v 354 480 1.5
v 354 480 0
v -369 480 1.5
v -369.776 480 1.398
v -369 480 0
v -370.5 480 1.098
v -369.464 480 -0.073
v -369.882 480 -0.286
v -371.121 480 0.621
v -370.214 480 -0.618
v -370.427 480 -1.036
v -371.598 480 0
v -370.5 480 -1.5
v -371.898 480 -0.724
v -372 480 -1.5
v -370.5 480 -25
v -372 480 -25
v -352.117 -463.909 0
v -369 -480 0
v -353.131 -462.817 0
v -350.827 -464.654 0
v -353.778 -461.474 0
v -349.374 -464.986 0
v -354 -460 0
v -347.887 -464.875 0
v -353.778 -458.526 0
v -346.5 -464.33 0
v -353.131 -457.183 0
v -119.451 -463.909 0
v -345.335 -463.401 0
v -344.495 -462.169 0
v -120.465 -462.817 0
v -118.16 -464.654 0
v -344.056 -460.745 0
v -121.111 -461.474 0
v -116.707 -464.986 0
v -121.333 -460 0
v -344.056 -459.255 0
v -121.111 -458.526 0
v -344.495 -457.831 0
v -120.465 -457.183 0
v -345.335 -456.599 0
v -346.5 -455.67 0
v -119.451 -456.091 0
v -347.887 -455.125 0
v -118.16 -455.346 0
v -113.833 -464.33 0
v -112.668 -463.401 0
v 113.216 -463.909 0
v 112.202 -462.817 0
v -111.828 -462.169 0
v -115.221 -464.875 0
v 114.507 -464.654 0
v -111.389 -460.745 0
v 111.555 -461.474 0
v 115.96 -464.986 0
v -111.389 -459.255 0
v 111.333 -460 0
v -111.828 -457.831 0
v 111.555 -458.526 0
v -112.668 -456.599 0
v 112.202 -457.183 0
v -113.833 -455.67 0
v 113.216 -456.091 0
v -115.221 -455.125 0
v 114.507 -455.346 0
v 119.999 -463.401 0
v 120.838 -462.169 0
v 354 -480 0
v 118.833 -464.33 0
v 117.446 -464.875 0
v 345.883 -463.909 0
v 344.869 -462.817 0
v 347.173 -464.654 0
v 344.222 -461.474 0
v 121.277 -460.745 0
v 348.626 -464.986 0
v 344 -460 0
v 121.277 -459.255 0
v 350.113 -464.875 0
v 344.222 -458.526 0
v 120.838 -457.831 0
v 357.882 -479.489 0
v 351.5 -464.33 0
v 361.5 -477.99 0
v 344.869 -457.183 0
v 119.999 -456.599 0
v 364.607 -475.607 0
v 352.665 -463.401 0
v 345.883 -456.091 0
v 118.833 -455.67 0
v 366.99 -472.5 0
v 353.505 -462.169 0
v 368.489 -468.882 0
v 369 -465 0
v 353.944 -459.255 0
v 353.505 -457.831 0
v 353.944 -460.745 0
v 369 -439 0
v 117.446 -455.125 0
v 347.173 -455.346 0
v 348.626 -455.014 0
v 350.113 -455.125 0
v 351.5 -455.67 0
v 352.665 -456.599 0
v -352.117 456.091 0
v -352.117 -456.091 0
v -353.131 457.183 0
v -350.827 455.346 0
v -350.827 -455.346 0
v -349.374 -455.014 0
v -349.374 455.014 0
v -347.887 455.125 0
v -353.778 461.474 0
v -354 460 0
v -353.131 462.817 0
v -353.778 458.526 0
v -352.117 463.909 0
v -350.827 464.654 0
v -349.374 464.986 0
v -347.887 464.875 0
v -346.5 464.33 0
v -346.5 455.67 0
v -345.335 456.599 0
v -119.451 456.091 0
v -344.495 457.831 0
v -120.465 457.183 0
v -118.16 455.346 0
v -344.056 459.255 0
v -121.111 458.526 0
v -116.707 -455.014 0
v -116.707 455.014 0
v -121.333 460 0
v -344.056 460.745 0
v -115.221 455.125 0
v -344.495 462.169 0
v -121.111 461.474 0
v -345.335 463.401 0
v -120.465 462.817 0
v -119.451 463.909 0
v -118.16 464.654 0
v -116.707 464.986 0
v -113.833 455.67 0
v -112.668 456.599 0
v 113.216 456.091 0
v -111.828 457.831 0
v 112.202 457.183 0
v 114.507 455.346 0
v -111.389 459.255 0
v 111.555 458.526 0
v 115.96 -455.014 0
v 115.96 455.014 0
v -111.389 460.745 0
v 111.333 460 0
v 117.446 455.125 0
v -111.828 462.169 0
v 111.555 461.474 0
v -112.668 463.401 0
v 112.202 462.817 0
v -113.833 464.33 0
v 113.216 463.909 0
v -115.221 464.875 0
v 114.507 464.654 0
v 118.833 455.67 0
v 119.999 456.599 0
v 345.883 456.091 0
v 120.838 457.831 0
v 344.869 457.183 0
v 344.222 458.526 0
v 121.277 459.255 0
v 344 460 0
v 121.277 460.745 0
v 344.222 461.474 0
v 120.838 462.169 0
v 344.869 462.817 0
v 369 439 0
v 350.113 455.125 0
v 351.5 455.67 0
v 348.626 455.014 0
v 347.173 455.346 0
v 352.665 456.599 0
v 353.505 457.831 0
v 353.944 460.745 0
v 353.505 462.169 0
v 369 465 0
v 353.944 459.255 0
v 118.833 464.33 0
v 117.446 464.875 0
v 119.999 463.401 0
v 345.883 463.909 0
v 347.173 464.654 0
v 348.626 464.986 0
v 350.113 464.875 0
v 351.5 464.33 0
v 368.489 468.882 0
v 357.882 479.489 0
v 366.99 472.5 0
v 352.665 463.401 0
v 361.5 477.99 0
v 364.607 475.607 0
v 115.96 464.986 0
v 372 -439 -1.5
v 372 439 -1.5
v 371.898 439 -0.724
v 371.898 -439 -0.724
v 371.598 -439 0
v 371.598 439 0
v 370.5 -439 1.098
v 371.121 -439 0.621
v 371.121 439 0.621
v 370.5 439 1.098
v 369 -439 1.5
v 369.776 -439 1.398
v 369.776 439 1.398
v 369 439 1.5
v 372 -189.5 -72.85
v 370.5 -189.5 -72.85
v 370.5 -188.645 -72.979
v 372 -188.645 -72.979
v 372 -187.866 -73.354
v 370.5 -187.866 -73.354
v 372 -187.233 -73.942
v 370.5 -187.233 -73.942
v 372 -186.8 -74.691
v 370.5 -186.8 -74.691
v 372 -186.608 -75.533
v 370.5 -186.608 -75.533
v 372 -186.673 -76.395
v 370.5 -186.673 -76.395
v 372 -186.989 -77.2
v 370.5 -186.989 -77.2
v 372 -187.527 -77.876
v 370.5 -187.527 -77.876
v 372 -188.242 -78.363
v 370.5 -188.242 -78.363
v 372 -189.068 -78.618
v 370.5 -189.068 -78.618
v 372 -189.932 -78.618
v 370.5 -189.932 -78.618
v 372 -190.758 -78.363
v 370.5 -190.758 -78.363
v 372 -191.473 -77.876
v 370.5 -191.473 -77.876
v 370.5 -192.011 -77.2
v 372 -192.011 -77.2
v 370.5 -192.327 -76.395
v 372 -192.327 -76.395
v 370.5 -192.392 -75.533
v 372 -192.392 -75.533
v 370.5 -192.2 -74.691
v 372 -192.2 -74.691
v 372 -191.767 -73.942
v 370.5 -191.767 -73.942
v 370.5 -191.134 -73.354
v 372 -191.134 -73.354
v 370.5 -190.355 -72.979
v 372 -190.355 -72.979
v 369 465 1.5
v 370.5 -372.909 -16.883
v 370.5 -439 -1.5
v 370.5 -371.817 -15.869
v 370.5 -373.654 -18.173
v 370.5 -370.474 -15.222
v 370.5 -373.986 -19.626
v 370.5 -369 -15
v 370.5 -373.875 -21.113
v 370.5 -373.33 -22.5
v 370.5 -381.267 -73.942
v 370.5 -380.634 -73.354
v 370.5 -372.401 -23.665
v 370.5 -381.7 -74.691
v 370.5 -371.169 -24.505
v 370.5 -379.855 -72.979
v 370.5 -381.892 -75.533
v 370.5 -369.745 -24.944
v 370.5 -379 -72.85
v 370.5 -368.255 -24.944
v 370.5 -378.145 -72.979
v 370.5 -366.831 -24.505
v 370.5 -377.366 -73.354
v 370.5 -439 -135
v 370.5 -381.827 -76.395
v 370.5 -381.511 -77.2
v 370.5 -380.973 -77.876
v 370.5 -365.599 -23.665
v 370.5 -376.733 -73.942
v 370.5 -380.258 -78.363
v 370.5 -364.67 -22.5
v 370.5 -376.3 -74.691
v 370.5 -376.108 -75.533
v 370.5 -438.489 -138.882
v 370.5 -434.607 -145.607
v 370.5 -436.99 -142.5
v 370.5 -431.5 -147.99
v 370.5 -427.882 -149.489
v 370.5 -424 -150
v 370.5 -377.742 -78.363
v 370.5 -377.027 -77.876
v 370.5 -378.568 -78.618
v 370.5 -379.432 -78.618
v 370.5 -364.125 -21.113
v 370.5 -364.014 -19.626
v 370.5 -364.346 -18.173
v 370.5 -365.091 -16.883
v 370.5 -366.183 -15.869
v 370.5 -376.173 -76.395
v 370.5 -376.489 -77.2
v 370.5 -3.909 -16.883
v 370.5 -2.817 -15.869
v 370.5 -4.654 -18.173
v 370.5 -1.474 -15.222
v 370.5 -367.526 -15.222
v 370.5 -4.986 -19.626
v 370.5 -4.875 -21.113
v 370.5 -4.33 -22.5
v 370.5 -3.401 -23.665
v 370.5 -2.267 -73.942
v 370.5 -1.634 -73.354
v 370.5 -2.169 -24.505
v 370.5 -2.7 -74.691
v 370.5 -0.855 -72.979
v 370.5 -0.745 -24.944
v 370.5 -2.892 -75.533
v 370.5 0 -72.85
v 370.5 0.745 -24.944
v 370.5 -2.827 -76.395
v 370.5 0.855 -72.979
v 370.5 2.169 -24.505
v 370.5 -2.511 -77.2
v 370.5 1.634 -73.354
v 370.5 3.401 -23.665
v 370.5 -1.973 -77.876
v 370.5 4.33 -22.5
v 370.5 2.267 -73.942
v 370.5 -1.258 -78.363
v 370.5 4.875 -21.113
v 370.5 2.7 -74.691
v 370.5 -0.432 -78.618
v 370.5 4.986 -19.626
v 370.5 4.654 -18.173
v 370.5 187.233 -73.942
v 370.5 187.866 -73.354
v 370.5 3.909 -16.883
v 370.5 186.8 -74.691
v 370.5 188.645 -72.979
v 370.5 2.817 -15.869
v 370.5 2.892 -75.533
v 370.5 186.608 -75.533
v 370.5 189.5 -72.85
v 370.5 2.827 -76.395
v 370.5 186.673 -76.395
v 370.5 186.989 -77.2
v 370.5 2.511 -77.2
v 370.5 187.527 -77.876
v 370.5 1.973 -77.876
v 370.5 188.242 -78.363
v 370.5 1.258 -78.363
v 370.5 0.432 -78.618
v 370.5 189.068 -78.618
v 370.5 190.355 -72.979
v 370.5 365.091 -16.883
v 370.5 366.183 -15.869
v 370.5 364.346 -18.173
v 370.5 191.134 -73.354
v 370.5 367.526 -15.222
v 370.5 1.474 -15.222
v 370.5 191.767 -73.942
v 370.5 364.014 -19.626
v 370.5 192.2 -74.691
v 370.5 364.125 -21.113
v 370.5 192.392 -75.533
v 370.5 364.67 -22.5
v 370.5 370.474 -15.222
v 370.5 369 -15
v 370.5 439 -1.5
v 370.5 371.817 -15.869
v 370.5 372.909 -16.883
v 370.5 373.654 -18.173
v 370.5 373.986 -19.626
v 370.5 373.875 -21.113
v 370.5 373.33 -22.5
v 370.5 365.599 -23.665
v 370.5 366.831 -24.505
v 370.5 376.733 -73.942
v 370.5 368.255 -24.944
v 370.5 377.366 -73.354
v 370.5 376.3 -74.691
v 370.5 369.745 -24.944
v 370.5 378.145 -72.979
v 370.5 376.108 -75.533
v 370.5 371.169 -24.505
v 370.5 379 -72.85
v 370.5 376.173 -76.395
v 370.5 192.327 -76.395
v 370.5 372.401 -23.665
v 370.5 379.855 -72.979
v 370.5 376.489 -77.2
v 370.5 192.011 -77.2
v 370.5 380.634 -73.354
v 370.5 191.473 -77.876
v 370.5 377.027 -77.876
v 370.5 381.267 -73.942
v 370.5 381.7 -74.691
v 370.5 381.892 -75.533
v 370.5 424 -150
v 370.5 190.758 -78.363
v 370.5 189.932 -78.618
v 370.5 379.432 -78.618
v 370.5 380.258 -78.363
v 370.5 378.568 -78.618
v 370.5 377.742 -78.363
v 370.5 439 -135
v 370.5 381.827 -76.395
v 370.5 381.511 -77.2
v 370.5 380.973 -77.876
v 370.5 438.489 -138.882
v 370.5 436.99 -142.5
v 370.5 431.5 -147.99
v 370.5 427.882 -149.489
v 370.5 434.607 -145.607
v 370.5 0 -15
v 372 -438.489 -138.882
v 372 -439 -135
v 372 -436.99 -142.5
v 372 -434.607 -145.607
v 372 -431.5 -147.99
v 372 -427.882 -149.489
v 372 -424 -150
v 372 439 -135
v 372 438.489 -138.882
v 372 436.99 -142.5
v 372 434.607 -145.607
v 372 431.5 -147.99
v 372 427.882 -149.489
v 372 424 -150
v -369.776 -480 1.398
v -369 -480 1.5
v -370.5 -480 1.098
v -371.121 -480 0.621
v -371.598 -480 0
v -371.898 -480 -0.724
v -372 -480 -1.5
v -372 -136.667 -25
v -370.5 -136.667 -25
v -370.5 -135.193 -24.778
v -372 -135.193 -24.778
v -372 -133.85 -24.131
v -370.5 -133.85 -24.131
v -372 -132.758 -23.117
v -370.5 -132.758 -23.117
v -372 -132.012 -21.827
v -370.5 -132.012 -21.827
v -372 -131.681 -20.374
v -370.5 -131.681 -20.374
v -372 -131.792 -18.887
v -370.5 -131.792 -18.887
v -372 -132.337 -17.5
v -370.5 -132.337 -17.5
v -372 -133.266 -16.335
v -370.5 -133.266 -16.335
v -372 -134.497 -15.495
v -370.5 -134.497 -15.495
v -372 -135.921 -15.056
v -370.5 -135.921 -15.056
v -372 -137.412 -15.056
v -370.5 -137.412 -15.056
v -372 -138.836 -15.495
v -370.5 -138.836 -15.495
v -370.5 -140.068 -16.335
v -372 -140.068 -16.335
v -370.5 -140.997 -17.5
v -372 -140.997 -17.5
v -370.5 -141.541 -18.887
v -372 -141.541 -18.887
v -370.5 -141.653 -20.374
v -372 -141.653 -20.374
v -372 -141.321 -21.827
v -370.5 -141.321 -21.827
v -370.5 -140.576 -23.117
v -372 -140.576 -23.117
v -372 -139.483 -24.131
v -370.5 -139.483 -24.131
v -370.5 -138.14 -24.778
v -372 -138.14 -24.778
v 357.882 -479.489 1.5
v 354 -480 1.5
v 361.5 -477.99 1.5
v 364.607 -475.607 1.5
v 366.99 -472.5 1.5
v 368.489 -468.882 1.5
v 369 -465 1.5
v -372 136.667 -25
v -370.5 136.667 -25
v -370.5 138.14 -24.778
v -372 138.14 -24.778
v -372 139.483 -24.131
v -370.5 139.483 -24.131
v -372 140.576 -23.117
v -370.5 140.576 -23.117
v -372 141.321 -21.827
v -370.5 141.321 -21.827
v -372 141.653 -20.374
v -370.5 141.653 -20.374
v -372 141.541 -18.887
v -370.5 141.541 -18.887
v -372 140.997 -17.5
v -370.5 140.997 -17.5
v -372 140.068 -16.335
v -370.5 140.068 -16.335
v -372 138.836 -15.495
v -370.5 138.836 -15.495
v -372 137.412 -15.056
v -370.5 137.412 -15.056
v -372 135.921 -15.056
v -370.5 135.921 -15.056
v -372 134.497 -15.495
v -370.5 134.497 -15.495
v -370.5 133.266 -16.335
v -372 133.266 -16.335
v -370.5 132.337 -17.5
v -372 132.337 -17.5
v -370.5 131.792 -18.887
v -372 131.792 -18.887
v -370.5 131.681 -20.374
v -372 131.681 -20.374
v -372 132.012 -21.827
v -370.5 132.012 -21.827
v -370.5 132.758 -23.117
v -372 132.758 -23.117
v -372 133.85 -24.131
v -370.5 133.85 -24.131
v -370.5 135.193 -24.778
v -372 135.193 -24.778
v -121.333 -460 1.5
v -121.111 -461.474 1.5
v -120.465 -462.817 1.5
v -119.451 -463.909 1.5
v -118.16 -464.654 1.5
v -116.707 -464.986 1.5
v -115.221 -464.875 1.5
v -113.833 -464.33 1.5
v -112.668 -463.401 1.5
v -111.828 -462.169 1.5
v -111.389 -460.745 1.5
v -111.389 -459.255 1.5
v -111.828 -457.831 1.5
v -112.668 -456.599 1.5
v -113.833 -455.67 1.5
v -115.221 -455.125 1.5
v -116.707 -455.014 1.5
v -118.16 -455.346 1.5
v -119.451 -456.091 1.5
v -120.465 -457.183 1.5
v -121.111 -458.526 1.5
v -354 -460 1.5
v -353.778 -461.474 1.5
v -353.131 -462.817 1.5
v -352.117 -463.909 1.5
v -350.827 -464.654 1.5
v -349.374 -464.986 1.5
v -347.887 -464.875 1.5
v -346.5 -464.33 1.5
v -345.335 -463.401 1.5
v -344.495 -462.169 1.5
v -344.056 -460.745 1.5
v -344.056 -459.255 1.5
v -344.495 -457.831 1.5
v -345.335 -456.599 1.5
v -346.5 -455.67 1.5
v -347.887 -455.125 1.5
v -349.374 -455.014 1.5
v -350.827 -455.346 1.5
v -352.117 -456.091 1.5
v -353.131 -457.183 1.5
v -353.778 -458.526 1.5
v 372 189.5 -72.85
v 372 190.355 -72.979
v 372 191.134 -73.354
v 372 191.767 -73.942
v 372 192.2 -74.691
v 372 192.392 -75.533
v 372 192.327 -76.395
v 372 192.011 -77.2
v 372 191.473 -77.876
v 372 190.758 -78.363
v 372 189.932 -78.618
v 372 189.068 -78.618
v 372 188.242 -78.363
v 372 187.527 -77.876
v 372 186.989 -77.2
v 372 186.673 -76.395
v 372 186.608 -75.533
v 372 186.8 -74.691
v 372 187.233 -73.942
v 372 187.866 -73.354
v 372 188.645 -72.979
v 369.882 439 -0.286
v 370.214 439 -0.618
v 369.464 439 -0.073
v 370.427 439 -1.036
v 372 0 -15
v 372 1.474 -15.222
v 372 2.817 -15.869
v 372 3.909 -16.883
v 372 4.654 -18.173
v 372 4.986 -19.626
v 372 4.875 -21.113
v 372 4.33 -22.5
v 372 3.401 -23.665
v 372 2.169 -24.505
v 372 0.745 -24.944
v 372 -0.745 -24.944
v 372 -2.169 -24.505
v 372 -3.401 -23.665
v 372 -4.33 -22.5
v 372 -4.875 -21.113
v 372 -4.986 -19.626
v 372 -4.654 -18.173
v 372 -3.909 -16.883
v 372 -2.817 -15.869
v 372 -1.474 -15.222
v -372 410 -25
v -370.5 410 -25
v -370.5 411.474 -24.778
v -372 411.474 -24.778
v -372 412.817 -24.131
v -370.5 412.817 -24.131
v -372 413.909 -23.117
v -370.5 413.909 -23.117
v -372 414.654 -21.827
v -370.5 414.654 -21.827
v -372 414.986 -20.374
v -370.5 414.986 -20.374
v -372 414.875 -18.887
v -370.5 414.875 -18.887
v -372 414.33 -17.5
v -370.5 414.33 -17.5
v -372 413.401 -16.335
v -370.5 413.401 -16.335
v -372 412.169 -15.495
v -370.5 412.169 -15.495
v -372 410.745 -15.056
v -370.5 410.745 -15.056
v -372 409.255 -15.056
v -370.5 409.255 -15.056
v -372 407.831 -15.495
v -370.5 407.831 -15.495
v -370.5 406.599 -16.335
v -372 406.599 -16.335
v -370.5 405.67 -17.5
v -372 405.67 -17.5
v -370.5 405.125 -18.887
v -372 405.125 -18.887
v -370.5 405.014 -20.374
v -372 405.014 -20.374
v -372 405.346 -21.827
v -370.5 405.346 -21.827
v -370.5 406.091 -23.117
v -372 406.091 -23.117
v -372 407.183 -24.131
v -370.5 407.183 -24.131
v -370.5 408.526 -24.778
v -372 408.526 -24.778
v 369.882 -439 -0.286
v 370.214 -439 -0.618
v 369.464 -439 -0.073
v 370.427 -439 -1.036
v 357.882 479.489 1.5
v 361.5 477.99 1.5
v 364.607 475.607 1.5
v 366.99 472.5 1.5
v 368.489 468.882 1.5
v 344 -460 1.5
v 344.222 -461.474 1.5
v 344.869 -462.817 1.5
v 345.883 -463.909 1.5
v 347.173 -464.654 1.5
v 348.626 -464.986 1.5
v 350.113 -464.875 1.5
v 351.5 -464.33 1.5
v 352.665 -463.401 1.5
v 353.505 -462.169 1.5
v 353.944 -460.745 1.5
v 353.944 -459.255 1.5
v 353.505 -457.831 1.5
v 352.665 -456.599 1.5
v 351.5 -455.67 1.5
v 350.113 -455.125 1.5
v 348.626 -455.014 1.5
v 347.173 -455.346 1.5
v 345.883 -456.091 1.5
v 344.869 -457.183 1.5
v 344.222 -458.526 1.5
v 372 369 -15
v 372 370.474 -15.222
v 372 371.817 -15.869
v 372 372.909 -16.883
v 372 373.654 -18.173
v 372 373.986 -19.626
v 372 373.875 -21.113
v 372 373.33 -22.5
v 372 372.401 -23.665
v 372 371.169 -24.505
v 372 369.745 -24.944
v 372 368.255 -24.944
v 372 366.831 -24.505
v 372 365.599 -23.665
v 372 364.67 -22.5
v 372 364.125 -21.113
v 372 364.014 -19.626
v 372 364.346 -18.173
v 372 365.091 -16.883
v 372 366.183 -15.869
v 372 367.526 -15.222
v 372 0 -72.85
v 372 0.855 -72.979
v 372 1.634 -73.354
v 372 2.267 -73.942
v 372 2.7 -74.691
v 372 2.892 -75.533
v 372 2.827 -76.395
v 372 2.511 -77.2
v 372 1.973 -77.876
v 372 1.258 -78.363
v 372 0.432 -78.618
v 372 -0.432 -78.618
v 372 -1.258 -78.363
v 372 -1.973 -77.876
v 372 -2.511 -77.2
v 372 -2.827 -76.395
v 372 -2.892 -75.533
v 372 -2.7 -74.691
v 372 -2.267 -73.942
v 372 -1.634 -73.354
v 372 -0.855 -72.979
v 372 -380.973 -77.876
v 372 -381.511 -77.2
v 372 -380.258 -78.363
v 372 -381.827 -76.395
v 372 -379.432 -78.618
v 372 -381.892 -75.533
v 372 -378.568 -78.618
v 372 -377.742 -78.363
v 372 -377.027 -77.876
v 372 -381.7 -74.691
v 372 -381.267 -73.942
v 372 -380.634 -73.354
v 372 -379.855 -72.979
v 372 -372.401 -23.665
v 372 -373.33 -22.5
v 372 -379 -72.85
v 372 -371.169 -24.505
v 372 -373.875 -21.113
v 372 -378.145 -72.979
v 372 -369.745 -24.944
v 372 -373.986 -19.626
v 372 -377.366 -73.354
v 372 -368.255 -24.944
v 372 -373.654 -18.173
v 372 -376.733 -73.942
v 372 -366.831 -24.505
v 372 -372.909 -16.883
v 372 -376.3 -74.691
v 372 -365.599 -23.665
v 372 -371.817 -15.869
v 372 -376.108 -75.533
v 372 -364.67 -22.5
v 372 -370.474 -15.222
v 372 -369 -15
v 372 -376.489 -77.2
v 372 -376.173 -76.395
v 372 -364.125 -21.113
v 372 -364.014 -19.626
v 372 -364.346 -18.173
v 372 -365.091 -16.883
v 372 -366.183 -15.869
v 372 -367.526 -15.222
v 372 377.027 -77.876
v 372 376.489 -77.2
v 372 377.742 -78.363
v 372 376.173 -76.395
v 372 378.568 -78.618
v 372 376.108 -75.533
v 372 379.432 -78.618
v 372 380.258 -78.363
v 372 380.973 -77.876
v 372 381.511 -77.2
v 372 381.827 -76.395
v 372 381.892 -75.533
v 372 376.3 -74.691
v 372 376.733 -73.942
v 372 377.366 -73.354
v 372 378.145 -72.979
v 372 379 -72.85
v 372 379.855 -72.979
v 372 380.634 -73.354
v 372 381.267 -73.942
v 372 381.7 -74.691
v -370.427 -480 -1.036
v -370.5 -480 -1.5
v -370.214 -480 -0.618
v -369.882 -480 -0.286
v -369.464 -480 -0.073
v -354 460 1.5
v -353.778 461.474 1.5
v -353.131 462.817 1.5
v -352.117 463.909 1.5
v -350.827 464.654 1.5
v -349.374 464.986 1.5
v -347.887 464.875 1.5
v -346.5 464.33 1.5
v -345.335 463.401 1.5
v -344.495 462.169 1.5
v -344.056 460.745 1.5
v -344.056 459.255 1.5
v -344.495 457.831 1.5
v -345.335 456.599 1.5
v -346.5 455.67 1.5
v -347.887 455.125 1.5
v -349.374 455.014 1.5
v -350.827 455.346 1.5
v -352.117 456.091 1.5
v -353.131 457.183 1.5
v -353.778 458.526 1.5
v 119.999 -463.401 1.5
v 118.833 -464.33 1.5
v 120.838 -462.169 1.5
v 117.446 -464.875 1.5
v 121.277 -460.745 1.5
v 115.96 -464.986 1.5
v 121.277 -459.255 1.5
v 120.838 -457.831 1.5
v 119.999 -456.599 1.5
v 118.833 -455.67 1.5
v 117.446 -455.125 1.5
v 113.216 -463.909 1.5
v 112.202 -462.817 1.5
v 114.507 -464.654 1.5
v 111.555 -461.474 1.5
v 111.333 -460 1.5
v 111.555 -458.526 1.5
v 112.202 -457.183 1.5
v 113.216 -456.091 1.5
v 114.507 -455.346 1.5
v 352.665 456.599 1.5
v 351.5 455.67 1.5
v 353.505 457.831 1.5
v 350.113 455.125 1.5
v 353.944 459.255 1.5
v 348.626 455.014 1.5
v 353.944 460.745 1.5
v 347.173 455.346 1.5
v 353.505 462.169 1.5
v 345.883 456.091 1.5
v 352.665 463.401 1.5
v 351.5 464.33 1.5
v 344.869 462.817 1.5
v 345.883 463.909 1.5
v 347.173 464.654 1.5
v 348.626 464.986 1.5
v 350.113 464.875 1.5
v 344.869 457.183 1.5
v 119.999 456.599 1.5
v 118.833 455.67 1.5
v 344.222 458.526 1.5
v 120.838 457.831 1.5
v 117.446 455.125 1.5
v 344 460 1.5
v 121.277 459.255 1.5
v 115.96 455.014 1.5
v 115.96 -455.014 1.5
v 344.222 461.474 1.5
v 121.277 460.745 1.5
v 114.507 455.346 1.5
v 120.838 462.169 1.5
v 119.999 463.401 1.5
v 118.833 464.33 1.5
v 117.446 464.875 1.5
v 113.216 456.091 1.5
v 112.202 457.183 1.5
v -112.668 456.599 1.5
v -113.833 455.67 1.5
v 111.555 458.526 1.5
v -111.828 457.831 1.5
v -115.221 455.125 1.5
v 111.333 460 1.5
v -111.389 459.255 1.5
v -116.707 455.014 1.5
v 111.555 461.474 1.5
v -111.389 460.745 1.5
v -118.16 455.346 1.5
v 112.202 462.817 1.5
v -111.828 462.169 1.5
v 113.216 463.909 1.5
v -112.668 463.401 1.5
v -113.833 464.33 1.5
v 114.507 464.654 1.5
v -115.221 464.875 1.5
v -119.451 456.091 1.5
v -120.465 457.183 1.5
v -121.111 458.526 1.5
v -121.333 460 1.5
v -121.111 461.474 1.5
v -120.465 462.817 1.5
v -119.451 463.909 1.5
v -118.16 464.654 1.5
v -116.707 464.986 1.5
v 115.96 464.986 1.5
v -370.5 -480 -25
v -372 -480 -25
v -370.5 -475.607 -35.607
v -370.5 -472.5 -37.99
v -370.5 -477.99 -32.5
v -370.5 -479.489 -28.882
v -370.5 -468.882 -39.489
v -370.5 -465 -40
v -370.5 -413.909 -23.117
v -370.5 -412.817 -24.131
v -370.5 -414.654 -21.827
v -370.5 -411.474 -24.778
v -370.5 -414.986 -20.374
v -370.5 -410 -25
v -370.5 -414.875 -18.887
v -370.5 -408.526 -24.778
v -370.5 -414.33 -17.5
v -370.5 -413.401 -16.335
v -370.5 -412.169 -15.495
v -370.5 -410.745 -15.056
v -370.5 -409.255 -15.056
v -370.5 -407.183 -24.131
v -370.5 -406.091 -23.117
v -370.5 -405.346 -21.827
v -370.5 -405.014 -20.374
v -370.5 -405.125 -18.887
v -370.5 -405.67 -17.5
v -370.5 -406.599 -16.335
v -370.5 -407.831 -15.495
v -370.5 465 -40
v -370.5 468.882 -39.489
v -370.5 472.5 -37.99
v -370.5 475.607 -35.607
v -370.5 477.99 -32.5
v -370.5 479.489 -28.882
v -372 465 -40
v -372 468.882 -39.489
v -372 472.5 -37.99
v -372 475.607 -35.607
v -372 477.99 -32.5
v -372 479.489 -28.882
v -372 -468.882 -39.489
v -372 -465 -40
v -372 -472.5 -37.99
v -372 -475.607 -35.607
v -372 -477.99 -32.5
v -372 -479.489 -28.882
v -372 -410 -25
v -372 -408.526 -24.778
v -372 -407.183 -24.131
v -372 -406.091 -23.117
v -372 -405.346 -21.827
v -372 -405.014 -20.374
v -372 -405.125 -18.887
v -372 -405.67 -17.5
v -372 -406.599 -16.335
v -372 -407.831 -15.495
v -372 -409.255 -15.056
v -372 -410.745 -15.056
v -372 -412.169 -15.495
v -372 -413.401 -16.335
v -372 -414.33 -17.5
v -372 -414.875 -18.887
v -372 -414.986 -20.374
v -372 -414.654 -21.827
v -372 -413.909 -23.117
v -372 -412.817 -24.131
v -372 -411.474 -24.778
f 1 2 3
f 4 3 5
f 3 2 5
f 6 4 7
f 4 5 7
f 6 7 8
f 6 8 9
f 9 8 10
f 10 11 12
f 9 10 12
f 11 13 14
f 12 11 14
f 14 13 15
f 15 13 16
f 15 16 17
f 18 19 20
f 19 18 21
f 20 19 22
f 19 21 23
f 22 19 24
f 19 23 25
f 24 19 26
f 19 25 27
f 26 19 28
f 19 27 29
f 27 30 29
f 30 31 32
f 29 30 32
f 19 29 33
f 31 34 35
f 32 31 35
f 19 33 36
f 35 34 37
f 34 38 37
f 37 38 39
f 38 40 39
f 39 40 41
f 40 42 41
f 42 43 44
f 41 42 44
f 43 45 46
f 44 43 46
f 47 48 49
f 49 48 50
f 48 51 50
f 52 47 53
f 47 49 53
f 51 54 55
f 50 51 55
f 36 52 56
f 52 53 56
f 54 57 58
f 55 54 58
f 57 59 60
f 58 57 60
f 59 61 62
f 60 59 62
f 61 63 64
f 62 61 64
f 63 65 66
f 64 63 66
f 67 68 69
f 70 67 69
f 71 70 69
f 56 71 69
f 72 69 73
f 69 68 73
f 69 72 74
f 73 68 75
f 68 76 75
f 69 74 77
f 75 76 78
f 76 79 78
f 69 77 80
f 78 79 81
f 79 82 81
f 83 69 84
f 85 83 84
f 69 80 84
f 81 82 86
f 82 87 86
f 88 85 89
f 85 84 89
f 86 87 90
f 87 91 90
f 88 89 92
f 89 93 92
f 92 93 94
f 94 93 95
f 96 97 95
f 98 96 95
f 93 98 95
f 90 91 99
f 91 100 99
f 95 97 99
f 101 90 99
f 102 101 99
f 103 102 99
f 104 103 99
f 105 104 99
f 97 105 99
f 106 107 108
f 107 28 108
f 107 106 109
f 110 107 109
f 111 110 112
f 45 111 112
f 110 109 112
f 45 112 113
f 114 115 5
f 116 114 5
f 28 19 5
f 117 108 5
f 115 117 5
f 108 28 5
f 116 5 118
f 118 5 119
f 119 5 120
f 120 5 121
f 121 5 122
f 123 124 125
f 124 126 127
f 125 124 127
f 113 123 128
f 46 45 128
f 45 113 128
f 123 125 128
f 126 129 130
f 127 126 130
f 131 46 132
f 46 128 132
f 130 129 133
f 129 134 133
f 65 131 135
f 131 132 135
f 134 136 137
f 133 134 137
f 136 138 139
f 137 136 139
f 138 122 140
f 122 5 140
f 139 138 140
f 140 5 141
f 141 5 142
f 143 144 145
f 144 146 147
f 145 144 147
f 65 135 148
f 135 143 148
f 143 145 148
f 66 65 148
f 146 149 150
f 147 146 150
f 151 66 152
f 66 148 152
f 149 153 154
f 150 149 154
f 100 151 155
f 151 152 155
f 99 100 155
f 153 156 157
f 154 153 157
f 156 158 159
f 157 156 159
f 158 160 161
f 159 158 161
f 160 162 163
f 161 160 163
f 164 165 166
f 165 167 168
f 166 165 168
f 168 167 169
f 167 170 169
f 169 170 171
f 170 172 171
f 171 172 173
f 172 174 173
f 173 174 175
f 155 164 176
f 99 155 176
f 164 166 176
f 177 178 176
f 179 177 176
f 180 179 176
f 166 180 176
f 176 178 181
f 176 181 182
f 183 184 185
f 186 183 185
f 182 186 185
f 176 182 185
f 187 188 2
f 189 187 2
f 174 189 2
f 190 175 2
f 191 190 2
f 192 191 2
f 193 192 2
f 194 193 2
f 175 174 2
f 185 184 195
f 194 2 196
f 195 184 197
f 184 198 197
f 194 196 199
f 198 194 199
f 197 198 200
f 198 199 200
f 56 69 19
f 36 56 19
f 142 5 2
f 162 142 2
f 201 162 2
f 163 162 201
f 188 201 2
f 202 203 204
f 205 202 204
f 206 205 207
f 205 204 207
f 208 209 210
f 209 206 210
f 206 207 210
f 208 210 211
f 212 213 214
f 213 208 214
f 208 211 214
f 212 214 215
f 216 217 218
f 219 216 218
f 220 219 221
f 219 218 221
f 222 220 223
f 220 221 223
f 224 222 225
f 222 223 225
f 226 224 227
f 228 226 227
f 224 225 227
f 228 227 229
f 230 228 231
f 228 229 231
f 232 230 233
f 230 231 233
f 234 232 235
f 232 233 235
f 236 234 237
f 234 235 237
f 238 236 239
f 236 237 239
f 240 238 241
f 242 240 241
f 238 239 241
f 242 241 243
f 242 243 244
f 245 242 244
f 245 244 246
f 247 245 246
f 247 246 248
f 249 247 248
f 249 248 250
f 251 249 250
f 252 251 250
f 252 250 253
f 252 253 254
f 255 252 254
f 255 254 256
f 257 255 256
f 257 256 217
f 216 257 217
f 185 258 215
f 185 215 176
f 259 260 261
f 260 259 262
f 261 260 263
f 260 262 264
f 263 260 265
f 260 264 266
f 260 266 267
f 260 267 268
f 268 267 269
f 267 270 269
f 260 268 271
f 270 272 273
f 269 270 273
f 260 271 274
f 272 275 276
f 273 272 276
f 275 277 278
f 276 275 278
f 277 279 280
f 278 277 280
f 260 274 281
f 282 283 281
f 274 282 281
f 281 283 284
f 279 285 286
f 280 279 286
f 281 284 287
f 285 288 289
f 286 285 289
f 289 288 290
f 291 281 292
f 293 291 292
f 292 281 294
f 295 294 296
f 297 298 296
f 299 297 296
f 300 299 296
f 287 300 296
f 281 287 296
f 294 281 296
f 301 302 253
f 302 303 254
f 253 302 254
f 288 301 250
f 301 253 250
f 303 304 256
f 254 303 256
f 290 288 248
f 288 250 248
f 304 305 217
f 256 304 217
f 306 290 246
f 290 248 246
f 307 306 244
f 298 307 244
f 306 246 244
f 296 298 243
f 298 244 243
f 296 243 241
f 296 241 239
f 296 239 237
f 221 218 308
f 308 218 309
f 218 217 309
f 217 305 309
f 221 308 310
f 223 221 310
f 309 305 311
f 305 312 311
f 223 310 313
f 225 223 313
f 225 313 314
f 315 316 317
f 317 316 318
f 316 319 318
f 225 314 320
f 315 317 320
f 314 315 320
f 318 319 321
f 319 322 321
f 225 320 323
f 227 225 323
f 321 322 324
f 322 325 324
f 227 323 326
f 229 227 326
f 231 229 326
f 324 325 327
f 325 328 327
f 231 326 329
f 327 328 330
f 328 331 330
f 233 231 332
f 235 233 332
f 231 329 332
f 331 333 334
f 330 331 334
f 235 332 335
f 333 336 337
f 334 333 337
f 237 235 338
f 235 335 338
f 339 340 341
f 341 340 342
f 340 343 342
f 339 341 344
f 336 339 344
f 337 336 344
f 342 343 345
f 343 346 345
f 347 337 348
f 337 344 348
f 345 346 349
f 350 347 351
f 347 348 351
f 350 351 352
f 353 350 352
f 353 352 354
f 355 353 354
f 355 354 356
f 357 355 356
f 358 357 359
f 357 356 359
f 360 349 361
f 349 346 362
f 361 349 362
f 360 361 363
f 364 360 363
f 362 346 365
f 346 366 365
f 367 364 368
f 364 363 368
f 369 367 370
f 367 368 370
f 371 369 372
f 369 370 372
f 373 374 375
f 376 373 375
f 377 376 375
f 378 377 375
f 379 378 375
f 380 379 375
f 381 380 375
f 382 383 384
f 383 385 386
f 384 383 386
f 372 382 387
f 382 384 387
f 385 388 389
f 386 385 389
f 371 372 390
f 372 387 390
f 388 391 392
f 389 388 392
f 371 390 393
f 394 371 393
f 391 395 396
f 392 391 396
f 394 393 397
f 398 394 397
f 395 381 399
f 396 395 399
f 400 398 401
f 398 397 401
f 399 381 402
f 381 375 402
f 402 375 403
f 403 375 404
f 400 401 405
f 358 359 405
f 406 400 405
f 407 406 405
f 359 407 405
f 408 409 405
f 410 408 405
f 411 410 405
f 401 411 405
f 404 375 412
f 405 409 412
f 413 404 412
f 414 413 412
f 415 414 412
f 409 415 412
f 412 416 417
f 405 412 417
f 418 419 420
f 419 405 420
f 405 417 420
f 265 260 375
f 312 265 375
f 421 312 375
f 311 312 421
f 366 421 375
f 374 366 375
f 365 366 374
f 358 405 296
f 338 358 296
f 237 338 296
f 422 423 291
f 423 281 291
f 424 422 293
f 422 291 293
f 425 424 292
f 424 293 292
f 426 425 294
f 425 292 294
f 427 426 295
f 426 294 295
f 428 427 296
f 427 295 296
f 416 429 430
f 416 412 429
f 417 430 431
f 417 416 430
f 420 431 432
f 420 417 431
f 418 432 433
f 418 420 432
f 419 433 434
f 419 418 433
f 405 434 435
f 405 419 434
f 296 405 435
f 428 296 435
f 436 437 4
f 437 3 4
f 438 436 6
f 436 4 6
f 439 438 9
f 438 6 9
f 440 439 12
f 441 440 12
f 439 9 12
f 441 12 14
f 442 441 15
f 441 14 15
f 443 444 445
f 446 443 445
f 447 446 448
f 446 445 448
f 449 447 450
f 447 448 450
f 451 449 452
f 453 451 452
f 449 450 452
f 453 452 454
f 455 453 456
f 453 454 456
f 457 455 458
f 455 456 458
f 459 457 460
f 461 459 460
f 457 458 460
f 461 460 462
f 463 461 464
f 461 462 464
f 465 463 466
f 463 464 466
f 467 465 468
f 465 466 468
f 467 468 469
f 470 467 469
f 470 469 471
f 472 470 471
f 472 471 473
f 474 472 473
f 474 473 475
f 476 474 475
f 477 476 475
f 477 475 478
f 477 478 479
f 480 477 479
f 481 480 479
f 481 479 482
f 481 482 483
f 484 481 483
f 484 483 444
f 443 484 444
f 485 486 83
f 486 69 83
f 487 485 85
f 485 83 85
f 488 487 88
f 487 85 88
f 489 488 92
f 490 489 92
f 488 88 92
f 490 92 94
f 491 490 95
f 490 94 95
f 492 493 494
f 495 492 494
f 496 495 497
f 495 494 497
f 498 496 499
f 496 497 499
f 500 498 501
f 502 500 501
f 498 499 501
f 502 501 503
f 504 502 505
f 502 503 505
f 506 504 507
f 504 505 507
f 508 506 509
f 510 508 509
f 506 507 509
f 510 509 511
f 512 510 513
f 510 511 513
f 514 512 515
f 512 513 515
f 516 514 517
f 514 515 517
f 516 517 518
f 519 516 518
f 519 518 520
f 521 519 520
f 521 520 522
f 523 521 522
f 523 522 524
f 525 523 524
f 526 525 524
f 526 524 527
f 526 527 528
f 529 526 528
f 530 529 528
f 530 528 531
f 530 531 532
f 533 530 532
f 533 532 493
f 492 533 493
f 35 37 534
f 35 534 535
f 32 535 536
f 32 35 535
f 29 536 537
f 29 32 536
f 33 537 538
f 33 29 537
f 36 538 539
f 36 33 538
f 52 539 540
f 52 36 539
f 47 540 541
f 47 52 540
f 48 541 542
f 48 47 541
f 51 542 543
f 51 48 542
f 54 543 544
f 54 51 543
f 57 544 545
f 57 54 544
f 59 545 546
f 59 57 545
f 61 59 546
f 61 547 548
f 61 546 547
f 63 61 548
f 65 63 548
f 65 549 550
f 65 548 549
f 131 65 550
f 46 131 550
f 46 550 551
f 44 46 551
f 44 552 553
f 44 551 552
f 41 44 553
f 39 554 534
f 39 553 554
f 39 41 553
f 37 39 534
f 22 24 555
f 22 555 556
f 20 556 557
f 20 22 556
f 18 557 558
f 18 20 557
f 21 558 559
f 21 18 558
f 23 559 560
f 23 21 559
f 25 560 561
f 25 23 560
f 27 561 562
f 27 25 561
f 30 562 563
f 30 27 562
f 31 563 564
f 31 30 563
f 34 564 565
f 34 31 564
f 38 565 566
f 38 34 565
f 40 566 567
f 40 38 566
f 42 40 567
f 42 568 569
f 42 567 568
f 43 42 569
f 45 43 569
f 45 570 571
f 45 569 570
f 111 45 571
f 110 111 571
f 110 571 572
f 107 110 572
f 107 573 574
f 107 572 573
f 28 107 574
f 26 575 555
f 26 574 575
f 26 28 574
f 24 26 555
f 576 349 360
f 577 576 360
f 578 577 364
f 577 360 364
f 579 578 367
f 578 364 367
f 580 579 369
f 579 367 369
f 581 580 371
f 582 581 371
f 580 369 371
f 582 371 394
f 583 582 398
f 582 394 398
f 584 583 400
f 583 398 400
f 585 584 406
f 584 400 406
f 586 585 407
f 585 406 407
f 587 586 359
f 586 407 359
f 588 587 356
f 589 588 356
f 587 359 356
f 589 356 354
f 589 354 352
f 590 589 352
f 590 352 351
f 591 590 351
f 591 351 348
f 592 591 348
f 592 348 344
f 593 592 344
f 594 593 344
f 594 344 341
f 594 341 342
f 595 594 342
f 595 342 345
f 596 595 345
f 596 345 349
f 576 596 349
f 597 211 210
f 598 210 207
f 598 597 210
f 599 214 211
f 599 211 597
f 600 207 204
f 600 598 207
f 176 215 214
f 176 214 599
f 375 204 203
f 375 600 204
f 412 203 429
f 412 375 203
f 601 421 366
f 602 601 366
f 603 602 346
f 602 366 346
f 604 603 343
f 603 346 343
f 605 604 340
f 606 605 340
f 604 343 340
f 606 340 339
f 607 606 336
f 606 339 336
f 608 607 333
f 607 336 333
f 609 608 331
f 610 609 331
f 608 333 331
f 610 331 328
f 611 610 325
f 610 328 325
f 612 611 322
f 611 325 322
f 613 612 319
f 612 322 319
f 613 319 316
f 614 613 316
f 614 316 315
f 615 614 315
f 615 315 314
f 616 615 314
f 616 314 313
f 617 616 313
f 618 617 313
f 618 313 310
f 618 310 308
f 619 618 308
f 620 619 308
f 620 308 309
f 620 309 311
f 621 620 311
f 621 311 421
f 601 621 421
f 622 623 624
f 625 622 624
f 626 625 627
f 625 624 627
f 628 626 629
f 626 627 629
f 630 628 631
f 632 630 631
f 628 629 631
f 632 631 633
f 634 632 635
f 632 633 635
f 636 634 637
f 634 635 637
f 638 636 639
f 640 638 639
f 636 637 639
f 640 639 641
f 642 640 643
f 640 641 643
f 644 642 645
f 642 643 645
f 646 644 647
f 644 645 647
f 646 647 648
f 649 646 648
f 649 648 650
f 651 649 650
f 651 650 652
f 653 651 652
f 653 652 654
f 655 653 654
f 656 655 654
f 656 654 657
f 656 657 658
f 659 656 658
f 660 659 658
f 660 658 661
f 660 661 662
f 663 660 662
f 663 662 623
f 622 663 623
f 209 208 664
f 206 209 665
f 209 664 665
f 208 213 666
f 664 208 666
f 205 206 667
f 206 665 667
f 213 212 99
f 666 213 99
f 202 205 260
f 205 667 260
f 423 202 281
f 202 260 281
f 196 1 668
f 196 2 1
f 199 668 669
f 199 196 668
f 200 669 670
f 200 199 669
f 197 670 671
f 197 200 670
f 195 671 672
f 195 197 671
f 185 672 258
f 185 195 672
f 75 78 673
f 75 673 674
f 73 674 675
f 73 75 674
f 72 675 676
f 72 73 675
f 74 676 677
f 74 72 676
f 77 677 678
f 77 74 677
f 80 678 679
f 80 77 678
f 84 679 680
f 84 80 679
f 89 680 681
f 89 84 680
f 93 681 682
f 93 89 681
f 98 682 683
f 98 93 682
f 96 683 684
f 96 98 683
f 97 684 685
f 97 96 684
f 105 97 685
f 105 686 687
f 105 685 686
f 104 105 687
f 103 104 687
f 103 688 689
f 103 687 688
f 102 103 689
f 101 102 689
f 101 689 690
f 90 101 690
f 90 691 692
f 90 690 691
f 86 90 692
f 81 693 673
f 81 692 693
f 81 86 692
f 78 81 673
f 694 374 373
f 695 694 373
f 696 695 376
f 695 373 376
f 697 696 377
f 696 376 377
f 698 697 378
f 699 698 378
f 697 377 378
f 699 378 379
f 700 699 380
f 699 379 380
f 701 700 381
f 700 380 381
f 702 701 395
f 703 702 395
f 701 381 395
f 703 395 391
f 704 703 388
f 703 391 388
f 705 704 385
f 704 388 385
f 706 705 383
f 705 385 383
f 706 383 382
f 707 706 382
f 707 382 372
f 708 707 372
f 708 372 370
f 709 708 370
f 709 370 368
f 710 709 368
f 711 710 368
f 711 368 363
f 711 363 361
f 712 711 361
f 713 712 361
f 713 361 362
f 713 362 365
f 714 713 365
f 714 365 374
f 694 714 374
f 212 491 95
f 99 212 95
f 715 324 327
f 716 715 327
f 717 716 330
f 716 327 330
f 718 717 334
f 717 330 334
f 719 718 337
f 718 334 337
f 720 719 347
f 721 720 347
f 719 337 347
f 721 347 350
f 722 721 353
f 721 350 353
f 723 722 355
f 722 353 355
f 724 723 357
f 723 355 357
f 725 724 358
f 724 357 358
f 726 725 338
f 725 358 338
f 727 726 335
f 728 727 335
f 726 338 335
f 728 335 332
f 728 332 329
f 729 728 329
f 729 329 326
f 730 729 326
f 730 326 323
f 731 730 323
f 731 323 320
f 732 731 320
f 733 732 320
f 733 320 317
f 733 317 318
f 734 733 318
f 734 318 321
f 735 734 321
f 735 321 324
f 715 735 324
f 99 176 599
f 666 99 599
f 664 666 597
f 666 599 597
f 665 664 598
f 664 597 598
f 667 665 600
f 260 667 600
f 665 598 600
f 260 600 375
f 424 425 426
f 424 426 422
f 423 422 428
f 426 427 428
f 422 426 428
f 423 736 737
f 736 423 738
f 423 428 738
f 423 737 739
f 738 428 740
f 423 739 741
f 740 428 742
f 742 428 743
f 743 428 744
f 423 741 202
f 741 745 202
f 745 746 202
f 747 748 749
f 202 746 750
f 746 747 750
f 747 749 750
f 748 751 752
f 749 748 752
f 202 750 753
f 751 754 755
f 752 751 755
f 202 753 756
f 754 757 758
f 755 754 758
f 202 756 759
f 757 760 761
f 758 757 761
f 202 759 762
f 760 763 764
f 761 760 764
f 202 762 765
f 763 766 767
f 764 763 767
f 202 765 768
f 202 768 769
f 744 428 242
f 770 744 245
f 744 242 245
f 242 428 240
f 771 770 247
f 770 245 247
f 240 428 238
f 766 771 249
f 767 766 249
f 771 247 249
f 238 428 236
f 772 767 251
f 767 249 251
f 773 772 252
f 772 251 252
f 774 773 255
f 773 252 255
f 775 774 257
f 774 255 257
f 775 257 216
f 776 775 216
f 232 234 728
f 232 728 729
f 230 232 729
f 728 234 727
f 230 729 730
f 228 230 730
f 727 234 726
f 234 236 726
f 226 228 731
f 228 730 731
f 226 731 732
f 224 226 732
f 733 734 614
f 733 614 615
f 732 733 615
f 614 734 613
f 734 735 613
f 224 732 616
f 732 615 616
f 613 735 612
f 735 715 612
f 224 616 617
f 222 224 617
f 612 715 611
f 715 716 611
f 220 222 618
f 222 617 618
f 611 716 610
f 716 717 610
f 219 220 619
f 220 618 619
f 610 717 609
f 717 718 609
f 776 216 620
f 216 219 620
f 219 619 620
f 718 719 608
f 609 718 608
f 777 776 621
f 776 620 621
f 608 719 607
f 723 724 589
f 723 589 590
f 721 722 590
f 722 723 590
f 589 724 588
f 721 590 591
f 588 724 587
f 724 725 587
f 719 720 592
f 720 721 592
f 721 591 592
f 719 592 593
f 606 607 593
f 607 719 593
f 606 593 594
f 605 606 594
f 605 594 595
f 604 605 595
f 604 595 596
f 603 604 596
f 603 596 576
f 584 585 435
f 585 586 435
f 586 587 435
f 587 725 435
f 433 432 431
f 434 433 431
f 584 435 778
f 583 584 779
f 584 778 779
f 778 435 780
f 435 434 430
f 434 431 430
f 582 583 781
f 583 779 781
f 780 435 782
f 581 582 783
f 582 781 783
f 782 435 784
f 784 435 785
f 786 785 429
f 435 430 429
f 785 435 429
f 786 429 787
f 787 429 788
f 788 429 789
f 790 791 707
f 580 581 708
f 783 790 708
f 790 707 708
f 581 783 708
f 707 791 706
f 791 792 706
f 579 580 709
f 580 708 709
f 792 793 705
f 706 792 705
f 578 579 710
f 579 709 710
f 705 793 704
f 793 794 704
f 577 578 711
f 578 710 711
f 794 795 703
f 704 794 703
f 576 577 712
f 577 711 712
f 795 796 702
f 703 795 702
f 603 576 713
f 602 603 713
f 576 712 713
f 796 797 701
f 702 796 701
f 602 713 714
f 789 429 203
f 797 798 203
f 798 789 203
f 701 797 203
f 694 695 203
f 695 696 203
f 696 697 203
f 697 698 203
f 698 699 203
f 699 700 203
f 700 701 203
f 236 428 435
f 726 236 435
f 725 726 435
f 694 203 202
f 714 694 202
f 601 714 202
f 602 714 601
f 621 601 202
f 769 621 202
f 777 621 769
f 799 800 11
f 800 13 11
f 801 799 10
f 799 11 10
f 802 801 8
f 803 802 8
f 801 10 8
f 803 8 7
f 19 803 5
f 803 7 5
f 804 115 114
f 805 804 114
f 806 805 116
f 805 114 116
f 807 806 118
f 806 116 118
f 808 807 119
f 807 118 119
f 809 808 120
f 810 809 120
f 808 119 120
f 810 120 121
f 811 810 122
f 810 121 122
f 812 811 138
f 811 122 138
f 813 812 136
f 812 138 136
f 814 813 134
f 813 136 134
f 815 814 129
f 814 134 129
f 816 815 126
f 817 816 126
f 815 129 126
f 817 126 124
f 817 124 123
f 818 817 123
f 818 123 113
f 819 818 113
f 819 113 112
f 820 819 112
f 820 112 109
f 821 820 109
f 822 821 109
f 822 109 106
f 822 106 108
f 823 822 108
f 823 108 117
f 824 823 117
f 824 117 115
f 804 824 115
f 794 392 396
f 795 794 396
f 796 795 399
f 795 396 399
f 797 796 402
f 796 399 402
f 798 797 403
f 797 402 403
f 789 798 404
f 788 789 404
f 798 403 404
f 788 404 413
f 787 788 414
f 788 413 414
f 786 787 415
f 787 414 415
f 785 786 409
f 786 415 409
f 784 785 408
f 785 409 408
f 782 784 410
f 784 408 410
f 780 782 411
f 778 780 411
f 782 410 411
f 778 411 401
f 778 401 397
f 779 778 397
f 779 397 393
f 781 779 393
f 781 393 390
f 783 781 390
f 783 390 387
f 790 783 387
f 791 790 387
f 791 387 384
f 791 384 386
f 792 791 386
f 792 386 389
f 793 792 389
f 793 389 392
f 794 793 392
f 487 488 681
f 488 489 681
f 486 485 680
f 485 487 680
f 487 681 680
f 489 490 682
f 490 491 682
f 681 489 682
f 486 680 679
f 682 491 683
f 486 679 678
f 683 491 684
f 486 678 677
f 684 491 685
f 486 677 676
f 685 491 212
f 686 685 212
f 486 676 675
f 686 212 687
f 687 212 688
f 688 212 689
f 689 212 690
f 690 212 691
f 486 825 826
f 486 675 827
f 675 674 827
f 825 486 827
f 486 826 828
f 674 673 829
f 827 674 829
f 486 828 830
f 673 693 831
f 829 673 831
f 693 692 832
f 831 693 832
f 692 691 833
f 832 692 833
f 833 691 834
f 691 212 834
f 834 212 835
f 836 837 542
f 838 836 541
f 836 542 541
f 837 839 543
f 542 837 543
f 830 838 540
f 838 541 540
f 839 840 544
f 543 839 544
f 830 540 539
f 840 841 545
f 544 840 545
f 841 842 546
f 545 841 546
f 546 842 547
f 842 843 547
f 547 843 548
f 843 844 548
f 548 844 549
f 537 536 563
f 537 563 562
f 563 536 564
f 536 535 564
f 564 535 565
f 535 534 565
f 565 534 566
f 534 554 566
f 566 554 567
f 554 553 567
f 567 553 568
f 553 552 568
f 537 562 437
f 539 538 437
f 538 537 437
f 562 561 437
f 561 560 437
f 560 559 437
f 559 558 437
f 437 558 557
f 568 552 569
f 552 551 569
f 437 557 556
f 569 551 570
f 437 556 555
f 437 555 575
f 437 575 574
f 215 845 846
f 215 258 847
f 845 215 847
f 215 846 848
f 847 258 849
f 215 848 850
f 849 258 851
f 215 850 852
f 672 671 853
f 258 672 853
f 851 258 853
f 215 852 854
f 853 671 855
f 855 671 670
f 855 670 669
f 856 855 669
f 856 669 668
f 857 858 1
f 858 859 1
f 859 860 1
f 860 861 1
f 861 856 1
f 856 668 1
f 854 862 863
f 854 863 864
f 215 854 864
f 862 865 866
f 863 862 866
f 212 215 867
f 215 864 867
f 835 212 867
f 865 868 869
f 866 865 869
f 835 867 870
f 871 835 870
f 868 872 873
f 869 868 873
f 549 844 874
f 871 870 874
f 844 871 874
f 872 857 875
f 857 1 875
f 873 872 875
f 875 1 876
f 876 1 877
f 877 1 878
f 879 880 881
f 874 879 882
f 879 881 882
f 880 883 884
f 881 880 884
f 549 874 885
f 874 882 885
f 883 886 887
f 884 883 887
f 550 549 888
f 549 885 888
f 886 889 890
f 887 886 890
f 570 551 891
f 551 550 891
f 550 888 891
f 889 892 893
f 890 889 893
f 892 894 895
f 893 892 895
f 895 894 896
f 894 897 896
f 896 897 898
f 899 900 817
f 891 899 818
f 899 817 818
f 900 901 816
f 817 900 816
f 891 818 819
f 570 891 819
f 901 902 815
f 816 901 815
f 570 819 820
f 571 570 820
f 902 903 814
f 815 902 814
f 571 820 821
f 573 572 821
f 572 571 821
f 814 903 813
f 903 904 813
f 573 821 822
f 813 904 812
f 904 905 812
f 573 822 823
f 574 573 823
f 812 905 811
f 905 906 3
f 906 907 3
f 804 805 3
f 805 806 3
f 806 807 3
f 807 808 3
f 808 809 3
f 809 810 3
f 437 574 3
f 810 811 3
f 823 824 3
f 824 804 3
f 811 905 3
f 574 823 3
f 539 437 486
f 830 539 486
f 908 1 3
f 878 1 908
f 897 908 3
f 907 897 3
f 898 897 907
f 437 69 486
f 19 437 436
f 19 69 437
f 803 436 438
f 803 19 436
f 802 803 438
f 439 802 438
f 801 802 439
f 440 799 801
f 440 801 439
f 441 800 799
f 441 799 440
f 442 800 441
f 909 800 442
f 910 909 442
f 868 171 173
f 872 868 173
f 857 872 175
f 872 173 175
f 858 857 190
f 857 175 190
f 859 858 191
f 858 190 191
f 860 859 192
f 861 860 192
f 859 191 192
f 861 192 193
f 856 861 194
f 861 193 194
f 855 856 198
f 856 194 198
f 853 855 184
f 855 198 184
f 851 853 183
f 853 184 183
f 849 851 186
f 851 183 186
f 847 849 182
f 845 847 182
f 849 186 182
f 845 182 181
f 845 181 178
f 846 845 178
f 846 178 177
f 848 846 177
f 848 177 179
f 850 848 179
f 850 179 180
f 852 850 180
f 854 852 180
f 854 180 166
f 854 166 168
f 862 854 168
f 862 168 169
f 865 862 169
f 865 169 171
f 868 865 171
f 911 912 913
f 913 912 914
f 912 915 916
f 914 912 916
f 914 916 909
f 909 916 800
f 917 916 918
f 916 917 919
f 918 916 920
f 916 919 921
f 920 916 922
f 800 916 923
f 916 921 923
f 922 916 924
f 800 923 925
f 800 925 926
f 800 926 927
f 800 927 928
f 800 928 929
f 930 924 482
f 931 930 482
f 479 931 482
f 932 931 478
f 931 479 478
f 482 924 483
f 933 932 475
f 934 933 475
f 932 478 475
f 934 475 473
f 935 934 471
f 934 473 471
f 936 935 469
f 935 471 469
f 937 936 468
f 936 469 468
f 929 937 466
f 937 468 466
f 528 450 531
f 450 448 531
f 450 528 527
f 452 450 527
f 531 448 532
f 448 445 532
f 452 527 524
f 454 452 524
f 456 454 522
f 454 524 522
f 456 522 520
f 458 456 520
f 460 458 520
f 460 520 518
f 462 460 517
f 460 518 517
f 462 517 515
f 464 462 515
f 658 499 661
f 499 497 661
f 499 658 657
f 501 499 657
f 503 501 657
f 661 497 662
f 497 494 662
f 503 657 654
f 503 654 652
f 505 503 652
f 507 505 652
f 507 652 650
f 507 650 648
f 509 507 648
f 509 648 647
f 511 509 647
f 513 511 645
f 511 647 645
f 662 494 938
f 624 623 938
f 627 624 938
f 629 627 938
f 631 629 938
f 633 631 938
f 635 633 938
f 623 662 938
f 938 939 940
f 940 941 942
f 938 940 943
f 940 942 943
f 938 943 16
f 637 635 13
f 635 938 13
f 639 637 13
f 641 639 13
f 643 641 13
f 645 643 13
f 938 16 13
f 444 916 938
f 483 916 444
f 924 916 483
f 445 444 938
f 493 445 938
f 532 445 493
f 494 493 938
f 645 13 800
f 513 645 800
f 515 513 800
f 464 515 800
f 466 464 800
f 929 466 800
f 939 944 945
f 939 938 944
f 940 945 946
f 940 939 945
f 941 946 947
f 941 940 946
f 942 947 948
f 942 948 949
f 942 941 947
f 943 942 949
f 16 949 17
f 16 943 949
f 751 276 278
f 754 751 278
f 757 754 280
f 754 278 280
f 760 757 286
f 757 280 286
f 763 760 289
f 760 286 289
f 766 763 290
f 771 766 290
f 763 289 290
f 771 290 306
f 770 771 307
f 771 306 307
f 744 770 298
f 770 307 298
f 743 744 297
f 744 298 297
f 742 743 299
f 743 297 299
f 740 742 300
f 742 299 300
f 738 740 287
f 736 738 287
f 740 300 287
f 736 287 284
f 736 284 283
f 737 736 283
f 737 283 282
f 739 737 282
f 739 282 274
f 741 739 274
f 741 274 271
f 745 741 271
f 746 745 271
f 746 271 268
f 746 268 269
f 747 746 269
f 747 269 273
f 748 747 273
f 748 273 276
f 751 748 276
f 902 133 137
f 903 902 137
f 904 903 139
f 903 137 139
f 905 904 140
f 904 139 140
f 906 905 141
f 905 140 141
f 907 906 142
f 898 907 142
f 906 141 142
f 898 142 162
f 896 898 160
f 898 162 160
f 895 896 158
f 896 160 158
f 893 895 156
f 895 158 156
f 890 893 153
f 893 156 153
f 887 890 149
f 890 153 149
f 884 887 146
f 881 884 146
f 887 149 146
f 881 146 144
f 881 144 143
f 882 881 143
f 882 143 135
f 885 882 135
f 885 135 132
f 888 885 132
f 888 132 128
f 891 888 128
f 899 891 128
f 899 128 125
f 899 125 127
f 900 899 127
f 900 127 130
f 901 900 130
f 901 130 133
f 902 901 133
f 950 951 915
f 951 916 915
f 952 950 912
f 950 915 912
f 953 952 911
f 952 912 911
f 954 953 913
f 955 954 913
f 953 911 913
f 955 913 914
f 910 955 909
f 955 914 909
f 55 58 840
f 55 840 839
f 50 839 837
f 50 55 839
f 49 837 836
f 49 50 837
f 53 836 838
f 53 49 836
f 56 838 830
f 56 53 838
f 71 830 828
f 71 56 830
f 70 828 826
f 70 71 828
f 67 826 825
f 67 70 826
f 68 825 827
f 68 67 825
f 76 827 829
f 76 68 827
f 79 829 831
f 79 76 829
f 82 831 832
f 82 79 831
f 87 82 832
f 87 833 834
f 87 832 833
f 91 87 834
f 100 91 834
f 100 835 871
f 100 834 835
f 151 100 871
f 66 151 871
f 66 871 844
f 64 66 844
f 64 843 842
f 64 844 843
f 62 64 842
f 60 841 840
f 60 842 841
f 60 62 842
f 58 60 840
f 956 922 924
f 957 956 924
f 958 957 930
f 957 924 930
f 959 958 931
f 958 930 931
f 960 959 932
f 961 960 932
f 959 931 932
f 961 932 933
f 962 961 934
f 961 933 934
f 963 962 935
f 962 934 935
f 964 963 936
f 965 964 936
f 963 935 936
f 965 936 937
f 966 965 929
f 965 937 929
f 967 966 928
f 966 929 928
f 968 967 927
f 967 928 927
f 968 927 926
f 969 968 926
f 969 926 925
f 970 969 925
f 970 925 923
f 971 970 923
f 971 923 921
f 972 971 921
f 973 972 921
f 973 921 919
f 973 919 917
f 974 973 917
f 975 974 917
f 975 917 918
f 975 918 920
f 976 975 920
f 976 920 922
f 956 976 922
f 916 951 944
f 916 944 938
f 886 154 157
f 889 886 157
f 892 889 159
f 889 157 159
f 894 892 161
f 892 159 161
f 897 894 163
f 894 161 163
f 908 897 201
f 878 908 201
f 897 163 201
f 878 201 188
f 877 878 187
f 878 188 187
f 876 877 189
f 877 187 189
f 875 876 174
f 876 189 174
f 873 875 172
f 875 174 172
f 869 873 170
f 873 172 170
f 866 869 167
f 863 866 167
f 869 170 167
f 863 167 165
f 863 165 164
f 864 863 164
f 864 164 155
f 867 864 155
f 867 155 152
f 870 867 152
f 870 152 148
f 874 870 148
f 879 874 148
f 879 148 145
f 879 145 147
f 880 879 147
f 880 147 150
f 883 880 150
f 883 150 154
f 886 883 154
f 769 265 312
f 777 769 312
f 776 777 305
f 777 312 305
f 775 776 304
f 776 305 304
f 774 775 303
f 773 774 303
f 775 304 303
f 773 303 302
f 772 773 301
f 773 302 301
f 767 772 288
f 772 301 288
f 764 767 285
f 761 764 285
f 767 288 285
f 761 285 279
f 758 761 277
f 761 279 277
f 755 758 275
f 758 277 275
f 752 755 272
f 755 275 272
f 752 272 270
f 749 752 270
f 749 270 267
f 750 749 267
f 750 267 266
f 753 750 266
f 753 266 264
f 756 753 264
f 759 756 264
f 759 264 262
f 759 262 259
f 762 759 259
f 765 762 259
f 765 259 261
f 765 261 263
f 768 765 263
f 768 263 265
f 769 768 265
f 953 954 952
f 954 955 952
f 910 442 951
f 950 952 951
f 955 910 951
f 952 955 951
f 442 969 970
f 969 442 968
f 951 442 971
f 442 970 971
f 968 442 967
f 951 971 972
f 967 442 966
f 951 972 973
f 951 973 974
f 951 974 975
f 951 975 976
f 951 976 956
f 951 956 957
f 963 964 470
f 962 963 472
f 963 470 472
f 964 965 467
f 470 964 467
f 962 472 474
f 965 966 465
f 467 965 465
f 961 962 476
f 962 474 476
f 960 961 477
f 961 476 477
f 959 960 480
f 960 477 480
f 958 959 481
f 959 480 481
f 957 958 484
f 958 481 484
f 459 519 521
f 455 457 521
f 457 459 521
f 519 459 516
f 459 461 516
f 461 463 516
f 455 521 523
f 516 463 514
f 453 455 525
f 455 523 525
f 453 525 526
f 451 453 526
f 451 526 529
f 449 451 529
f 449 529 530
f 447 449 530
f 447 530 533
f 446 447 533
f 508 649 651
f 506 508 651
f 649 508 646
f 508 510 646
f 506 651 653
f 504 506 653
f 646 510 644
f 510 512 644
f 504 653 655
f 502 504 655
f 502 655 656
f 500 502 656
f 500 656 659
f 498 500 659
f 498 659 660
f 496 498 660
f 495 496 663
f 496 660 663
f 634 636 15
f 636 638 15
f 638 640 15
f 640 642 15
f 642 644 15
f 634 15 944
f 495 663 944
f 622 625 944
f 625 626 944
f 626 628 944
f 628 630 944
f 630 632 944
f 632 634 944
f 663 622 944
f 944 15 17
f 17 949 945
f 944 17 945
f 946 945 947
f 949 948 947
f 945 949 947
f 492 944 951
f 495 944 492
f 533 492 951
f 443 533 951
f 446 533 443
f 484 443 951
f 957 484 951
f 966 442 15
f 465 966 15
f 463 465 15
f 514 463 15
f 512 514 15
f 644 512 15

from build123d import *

# Parameters (mm, degrees)
BASE_FLANGE1_DEPTH       = 480
CUT_EXTRUDE1_START       = -3
SKETCH6_W                = 170
SKETCH6_H                = 41
CUT_EXTRUDE1_DEPTH       = 902.017817195
M5_CLEARANCE_HOLE1_D     = 5.8
FILLET1_R                = 15
M8_CLEARANCE_HOLE1_D     = 10
M8_CLEARANCE_HOLE2_D     = 10
M8_CLEARANCE_HOLE2_DEPTH = 8.995696905
M8_CLEARANCE_HOLE2_TIP   = 3.004303095
M8_CLEARANCE_HOLE3_D     = 10
M8_CLEARANCE_HOLE3_DEPTH = 8.995696905
M8_CLEARANCE_HOLE3_TIP   = 3.004303095


# Sheet-metal steps are written as plain solids
with BuildPart() as part:
    # Sketch1 → Base-Flange1 (new, symmetric)
    with BuildSketch(Plane(origin=(0, 0, 0), x_dir=(1, 0, 0), z_dir=(0, 1, 0))):
        with BuildLine():
            Line((-370.5, 40), (-370.5, 1.5))
            ThreePointArc((-370.5, 1.5), (-370.060660172, 0.439339828), (-369, 0))
            Line((-369, 0), (369, 0))
            ThreePointArc((369, 0), (370.060660172, 0.439339828), (370.5, 1.5))
            Line((370.5, 1.5), (370.5, 150))
            Line((370.5, 150), (372, 150))
            Line((372, 150), (372, 1.5))
            ThreePointArc((372, 1.5), (371.121320344, -0.621320344), (369, -1.5))
            Line((369, -1.5), (-369, -1.5))
            ThreePointArc((-369, -1.5), (-371.121320344, -0.621320344), (-372, 1.5))
            Line((-372, 1.5), (-372, 40))
            Line((-372, 40), (-370.5, 40))
        make_face()
    extrude(amount=BASE_FLANGE1_DEPTH, both=True)

    # Sketch6 → Cut-Extrude1 (cut)
    with BuildSketch(Plane(origin=(372, 0, 0), x_dir=(0, 0, -1), z_dir=(1, 0, 0)).offset(CUT_EXTRUDE1_START)):
        with Locations((73.5, 459.5)):
            Rectangle(SKETCH6_W, SKETCH6_H)
    cut_extrude1 = extrude(amount=CUT_EXTRUDE1_DEPTH, mode=Mode.SUBTRACT)

    # Mirror1: Cut-Extrude1 across plane
    add(cut_extrude1.mirror(Plane.ZX), mode=Mode.SUBTRACT)

    # M5 Clearance Hole1 (through all)
    with Locations(Plane(origin=(372, 0, 0), x_dir=(0, 0, -1), z_dir=(1, 0, 0))):
        with Locations((75.75, 379), (75.75, 189.5), (75.75, 0), (75.75, -189.5), (75.75, -379)):
            Hole(M5_CLEARANCE_HOLE1_D / 2)

    # Fillet1
    fillet1_edges = [part.edges().sort_by_distance(p)[0] for p in [
        (-371.25, -480, -40),
        (369, -480, 0.75),
        (369, 480, 0.75),
        (371.25, 439, -150),
        (371.25, -439, -150),
        (-371.25, 480, -40),
    ]]
    fillet(fillet1_edges, radius=FILLET1_R)

    # M8 Clearance Hole1 (through all)
    with Locations(Plane.XY.offset(1.5)):
        with Locations((349, 460), (116.333333333, 460), (-116.333333333, 460), (-349, 460)):
            m8_clearance_hole1 = Hole(M8_CLEARANCE_HOLE1_D / 2)

    # Mirror2: M8 Clearance Hole1 across plane
    add(m8_clearance_hole1.mirror(Plane.ZX), mode=Mode.SUBTRACT)

    # M8 Clearance Hole2
    with Locations(Plane.ZY.offset(372)):
        with Locations((-20, 410), (-20, 136.666666667), (-20, -136.666666667), (-20, -410)):
            Hole(M8_CLEARANCE_HOLE2_D / 2, depth=M8_CLEARANCE_HOLE2_DEPTH)
            with Locations((0, 0, -(M8_CLEARANCE_HOLE2_DEPTH + M8_CLEARANCE_HOLE2_TIP / 2))):  # 118° drill point
                Cone(0, M8_CLEARANCE_HOLE2_D / 2, M8_CLEARANCE_HOLE2_TIP, mode=Mode.SUBTRACT)

    # M8 Clearance Hole3
    with Locations(Plane(origin=(372, 0, 0), x_dir=(0, 0, -1), z_dir=(1, 0, 0))):
        with Locations((20, 369), (20, 0), (20, -369)):
            Hole(M8_CLEARANCE_HOLE3_D / 2, depth=M8_CLEARANCE_HOLE3_DEPTH)
            with Locations((0, 0, -(M8_CLEARANCE_HOLE3_DEPTH + M8_CLEARANCE_HOLE3_TIP / 2))):  # 118° drill point
                Cone(0, M8_CLEARANCE_HOLE3_D / 2, M8_CLEARANCE_HOLE3_TIP, mode=Mode.SUBTRACT)


solid = part.part
